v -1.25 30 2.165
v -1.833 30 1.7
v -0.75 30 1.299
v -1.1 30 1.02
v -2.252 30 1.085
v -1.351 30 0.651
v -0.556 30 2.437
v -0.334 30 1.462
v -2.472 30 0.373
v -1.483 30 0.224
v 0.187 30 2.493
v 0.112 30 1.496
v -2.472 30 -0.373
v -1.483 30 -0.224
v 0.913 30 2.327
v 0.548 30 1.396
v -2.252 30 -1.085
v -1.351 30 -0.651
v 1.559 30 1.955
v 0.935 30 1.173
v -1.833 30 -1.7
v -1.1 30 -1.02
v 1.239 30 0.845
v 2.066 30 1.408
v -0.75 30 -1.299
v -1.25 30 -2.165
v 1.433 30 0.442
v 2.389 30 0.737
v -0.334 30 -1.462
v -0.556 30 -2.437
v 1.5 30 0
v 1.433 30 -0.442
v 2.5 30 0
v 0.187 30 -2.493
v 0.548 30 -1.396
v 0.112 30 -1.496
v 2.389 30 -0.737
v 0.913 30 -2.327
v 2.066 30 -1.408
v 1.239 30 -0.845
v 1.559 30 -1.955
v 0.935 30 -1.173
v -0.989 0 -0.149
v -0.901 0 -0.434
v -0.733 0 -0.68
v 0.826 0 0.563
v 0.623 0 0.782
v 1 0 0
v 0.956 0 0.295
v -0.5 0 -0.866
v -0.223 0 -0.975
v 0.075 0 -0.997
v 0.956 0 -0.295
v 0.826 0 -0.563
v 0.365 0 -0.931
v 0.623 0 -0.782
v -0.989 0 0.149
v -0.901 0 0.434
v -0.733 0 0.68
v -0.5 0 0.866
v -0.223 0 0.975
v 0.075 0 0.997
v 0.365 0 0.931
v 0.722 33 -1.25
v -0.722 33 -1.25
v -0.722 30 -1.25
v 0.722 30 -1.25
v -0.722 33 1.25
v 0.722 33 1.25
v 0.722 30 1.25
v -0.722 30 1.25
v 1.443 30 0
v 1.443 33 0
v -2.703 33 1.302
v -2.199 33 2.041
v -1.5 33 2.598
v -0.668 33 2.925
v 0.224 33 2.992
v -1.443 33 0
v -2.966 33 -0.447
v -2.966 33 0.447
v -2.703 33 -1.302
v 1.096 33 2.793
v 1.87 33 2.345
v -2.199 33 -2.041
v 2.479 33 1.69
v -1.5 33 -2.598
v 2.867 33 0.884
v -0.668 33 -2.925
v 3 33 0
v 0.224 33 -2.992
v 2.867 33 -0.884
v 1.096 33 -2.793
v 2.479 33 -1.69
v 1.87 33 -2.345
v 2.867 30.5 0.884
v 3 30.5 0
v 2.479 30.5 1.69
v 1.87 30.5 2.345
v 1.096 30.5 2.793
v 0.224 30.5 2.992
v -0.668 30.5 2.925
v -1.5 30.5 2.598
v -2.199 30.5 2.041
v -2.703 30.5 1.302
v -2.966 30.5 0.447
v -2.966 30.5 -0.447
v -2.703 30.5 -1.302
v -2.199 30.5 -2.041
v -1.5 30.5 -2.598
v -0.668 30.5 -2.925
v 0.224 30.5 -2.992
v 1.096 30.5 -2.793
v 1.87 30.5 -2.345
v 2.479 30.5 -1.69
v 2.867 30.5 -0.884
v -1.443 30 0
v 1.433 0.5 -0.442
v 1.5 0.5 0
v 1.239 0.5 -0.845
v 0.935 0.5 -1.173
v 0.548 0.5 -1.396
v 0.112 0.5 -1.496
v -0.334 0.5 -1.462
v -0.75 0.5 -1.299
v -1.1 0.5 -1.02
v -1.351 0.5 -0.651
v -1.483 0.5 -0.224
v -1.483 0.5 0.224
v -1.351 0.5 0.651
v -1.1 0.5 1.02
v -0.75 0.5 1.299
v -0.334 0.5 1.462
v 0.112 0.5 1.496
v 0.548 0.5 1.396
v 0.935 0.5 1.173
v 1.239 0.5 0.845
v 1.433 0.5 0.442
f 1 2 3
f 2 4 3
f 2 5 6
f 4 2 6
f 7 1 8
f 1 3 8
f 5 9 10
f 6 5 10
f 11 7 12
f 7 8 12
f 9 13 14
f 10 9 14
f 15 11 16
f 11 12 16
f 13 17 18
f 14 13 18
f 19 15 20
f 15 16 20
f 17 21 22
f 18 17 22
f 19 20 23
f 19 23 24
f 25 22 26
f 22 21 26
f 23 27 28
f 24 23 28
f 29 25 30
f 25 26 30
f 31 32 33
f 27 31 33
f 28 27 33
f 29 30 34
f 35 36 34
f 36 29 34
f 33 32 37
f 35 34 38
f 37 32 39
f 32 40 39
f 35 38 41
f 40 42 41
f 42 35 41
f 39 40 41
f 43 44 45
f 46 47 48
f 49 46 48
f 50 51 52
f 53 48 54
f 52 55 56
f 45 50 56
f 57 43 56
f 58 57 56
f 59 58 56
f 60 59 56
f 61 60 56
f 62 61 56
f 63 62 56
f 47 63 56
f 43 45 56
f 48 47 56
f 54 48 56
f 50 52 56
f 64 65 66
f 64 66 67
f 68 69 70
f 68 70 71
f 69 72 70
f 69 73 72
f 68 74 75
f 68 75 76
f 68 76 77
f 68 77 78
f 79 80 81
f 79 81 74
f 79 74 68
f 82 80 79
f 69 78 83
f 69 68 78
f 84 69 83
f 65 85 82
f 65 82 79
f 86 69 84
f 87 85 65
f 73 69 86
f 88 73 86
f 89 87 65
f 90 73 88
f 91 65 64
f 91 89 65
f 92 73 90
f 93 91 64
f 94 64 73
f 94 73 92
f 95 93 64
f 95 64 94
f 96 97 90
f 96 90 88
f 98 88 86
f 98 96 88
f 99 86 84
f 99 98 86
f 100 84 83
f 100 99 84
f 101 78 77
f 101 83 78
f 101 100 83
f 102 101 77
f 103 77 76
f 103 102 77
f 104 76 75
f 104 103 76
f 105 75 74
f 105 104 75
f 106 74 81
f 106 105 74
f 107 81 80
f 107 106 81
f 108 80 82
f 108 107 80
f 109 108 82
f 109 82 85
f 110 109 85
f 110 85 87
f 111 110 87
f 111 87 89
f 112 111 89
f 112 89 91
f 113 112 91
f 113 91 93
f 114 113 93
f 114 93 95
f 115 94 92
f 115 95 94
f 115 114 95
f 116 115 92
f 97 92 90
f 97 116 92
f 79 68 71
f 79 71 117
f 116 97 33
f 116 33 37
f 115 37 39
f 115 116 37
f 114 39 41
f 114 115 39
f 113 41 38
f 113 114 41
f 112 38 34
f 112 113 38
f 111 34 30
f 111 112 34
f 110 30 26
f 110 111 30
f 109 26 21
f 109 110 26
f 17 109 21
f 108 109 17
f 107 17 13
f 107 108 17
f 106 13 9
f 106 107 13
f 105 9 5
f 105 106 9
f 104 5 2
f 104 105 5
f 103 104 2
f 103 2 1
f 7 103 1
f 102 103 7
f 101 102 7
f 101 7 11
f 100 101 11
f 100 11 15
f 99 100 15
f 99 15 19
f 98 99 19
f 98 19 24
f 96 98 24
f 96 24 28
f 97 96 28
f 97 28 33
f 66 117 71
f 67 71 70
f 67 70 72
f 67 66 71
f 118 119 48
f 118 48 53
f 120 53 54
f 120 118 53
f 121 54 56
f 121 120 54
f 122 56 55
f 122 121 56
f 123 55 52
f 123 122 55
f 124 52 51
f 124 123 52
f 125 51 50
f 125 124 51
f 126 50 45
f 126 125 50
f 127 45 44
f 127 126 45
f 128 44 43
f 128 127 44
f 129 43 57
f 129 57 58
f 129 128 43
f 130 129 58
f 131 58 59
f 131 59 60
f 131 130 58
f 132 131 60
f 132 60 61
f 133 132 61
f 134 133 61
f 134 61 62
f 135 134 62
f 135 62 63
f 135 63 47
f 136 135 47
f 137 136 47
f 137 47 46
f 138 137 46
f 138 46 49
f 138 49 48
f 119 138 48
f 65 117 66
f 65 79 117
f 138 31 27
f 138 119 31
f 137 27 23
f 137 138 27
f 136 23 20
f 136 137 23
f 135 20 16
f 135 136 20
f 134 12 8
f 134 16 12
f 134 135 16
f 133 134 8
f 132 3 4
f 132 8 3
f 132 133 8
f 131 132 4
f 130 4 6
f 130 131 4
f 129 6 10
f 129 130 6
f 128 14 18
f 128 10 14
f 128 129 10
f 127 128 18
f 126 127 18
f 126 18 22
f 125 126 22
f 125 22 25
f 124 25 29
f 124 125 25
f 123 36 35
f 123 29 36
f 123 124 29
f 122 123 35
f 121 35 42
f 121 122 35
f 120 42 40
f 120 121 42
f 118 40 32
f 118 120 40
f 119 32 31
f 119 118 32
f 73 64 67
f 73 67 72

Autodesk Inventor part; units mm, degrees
ref_plane "YZ Plane" through (0, 0, 0) normal (1, 0, 0) x (0, 1, 0)
ref_plane "XZ Plane" through (0, 0, 0) normal (0, 1, 0) x (-1, 0, 0)
ref_plane "XY Plane" through (0, 0, 0) normal (0, 0, 1) x (1, 0, 0)
sketch "Sketch1" plane through (0, 0, 0) normal (0, 0, 1) x (1, 0, 0)
  line L0 (0, 0) -> (0, 33)
  line L1 (0, 33) -> (3, 33)
  line L2 (3, 33) -> (3, 30)
  line L3 (3, 30) -> (1.5, 30)
  line L4 (1.5, 30) -> (1.5, 0)
  line L5 (1.5, 0) -> (0, 0)
  dimension "d0" = 30
  dimension "d1" = 1.5
  dimension "d2" = 3
  dimension "d3" = 3
revolve "Revolution1" add sketch "Sketch1" angle 360 about axis through (0, 0, 0) along (0, 1, 0)
sketch "Sketch2" plane through (0, 33, 0) normal (0, 1, 0) x (1, 0, 0)
  line L0 (0.7217, 1.25) -> (1.4434, 0)
  line L1 (1.4434, 0) -> (0.7217, -1.25)
  line L2 (0.7217, -1.25) -> (-0.7217, -1.25)
  line L3 (-0.7217, -1.25) -> (-1.4434, 0)
  line L4 (-1.4434, 0) -> (-0.7217, 1.25)
  line L5 (-0.7217, 1.25) -> (0.7217, 1.25)
  point P0 (0, 0)
  point P1 (0, 0)
  dimension "d5" = 2.5
extrude "Extrusion1" cut sketch "Sketch2" against normal blind 3
chamfer "Chamfer1" distance 0.5 angle 45 2 edges at (-3, 30, 0) (-1.5, 0, 0)
properties part number "M3x30 SHCS"
